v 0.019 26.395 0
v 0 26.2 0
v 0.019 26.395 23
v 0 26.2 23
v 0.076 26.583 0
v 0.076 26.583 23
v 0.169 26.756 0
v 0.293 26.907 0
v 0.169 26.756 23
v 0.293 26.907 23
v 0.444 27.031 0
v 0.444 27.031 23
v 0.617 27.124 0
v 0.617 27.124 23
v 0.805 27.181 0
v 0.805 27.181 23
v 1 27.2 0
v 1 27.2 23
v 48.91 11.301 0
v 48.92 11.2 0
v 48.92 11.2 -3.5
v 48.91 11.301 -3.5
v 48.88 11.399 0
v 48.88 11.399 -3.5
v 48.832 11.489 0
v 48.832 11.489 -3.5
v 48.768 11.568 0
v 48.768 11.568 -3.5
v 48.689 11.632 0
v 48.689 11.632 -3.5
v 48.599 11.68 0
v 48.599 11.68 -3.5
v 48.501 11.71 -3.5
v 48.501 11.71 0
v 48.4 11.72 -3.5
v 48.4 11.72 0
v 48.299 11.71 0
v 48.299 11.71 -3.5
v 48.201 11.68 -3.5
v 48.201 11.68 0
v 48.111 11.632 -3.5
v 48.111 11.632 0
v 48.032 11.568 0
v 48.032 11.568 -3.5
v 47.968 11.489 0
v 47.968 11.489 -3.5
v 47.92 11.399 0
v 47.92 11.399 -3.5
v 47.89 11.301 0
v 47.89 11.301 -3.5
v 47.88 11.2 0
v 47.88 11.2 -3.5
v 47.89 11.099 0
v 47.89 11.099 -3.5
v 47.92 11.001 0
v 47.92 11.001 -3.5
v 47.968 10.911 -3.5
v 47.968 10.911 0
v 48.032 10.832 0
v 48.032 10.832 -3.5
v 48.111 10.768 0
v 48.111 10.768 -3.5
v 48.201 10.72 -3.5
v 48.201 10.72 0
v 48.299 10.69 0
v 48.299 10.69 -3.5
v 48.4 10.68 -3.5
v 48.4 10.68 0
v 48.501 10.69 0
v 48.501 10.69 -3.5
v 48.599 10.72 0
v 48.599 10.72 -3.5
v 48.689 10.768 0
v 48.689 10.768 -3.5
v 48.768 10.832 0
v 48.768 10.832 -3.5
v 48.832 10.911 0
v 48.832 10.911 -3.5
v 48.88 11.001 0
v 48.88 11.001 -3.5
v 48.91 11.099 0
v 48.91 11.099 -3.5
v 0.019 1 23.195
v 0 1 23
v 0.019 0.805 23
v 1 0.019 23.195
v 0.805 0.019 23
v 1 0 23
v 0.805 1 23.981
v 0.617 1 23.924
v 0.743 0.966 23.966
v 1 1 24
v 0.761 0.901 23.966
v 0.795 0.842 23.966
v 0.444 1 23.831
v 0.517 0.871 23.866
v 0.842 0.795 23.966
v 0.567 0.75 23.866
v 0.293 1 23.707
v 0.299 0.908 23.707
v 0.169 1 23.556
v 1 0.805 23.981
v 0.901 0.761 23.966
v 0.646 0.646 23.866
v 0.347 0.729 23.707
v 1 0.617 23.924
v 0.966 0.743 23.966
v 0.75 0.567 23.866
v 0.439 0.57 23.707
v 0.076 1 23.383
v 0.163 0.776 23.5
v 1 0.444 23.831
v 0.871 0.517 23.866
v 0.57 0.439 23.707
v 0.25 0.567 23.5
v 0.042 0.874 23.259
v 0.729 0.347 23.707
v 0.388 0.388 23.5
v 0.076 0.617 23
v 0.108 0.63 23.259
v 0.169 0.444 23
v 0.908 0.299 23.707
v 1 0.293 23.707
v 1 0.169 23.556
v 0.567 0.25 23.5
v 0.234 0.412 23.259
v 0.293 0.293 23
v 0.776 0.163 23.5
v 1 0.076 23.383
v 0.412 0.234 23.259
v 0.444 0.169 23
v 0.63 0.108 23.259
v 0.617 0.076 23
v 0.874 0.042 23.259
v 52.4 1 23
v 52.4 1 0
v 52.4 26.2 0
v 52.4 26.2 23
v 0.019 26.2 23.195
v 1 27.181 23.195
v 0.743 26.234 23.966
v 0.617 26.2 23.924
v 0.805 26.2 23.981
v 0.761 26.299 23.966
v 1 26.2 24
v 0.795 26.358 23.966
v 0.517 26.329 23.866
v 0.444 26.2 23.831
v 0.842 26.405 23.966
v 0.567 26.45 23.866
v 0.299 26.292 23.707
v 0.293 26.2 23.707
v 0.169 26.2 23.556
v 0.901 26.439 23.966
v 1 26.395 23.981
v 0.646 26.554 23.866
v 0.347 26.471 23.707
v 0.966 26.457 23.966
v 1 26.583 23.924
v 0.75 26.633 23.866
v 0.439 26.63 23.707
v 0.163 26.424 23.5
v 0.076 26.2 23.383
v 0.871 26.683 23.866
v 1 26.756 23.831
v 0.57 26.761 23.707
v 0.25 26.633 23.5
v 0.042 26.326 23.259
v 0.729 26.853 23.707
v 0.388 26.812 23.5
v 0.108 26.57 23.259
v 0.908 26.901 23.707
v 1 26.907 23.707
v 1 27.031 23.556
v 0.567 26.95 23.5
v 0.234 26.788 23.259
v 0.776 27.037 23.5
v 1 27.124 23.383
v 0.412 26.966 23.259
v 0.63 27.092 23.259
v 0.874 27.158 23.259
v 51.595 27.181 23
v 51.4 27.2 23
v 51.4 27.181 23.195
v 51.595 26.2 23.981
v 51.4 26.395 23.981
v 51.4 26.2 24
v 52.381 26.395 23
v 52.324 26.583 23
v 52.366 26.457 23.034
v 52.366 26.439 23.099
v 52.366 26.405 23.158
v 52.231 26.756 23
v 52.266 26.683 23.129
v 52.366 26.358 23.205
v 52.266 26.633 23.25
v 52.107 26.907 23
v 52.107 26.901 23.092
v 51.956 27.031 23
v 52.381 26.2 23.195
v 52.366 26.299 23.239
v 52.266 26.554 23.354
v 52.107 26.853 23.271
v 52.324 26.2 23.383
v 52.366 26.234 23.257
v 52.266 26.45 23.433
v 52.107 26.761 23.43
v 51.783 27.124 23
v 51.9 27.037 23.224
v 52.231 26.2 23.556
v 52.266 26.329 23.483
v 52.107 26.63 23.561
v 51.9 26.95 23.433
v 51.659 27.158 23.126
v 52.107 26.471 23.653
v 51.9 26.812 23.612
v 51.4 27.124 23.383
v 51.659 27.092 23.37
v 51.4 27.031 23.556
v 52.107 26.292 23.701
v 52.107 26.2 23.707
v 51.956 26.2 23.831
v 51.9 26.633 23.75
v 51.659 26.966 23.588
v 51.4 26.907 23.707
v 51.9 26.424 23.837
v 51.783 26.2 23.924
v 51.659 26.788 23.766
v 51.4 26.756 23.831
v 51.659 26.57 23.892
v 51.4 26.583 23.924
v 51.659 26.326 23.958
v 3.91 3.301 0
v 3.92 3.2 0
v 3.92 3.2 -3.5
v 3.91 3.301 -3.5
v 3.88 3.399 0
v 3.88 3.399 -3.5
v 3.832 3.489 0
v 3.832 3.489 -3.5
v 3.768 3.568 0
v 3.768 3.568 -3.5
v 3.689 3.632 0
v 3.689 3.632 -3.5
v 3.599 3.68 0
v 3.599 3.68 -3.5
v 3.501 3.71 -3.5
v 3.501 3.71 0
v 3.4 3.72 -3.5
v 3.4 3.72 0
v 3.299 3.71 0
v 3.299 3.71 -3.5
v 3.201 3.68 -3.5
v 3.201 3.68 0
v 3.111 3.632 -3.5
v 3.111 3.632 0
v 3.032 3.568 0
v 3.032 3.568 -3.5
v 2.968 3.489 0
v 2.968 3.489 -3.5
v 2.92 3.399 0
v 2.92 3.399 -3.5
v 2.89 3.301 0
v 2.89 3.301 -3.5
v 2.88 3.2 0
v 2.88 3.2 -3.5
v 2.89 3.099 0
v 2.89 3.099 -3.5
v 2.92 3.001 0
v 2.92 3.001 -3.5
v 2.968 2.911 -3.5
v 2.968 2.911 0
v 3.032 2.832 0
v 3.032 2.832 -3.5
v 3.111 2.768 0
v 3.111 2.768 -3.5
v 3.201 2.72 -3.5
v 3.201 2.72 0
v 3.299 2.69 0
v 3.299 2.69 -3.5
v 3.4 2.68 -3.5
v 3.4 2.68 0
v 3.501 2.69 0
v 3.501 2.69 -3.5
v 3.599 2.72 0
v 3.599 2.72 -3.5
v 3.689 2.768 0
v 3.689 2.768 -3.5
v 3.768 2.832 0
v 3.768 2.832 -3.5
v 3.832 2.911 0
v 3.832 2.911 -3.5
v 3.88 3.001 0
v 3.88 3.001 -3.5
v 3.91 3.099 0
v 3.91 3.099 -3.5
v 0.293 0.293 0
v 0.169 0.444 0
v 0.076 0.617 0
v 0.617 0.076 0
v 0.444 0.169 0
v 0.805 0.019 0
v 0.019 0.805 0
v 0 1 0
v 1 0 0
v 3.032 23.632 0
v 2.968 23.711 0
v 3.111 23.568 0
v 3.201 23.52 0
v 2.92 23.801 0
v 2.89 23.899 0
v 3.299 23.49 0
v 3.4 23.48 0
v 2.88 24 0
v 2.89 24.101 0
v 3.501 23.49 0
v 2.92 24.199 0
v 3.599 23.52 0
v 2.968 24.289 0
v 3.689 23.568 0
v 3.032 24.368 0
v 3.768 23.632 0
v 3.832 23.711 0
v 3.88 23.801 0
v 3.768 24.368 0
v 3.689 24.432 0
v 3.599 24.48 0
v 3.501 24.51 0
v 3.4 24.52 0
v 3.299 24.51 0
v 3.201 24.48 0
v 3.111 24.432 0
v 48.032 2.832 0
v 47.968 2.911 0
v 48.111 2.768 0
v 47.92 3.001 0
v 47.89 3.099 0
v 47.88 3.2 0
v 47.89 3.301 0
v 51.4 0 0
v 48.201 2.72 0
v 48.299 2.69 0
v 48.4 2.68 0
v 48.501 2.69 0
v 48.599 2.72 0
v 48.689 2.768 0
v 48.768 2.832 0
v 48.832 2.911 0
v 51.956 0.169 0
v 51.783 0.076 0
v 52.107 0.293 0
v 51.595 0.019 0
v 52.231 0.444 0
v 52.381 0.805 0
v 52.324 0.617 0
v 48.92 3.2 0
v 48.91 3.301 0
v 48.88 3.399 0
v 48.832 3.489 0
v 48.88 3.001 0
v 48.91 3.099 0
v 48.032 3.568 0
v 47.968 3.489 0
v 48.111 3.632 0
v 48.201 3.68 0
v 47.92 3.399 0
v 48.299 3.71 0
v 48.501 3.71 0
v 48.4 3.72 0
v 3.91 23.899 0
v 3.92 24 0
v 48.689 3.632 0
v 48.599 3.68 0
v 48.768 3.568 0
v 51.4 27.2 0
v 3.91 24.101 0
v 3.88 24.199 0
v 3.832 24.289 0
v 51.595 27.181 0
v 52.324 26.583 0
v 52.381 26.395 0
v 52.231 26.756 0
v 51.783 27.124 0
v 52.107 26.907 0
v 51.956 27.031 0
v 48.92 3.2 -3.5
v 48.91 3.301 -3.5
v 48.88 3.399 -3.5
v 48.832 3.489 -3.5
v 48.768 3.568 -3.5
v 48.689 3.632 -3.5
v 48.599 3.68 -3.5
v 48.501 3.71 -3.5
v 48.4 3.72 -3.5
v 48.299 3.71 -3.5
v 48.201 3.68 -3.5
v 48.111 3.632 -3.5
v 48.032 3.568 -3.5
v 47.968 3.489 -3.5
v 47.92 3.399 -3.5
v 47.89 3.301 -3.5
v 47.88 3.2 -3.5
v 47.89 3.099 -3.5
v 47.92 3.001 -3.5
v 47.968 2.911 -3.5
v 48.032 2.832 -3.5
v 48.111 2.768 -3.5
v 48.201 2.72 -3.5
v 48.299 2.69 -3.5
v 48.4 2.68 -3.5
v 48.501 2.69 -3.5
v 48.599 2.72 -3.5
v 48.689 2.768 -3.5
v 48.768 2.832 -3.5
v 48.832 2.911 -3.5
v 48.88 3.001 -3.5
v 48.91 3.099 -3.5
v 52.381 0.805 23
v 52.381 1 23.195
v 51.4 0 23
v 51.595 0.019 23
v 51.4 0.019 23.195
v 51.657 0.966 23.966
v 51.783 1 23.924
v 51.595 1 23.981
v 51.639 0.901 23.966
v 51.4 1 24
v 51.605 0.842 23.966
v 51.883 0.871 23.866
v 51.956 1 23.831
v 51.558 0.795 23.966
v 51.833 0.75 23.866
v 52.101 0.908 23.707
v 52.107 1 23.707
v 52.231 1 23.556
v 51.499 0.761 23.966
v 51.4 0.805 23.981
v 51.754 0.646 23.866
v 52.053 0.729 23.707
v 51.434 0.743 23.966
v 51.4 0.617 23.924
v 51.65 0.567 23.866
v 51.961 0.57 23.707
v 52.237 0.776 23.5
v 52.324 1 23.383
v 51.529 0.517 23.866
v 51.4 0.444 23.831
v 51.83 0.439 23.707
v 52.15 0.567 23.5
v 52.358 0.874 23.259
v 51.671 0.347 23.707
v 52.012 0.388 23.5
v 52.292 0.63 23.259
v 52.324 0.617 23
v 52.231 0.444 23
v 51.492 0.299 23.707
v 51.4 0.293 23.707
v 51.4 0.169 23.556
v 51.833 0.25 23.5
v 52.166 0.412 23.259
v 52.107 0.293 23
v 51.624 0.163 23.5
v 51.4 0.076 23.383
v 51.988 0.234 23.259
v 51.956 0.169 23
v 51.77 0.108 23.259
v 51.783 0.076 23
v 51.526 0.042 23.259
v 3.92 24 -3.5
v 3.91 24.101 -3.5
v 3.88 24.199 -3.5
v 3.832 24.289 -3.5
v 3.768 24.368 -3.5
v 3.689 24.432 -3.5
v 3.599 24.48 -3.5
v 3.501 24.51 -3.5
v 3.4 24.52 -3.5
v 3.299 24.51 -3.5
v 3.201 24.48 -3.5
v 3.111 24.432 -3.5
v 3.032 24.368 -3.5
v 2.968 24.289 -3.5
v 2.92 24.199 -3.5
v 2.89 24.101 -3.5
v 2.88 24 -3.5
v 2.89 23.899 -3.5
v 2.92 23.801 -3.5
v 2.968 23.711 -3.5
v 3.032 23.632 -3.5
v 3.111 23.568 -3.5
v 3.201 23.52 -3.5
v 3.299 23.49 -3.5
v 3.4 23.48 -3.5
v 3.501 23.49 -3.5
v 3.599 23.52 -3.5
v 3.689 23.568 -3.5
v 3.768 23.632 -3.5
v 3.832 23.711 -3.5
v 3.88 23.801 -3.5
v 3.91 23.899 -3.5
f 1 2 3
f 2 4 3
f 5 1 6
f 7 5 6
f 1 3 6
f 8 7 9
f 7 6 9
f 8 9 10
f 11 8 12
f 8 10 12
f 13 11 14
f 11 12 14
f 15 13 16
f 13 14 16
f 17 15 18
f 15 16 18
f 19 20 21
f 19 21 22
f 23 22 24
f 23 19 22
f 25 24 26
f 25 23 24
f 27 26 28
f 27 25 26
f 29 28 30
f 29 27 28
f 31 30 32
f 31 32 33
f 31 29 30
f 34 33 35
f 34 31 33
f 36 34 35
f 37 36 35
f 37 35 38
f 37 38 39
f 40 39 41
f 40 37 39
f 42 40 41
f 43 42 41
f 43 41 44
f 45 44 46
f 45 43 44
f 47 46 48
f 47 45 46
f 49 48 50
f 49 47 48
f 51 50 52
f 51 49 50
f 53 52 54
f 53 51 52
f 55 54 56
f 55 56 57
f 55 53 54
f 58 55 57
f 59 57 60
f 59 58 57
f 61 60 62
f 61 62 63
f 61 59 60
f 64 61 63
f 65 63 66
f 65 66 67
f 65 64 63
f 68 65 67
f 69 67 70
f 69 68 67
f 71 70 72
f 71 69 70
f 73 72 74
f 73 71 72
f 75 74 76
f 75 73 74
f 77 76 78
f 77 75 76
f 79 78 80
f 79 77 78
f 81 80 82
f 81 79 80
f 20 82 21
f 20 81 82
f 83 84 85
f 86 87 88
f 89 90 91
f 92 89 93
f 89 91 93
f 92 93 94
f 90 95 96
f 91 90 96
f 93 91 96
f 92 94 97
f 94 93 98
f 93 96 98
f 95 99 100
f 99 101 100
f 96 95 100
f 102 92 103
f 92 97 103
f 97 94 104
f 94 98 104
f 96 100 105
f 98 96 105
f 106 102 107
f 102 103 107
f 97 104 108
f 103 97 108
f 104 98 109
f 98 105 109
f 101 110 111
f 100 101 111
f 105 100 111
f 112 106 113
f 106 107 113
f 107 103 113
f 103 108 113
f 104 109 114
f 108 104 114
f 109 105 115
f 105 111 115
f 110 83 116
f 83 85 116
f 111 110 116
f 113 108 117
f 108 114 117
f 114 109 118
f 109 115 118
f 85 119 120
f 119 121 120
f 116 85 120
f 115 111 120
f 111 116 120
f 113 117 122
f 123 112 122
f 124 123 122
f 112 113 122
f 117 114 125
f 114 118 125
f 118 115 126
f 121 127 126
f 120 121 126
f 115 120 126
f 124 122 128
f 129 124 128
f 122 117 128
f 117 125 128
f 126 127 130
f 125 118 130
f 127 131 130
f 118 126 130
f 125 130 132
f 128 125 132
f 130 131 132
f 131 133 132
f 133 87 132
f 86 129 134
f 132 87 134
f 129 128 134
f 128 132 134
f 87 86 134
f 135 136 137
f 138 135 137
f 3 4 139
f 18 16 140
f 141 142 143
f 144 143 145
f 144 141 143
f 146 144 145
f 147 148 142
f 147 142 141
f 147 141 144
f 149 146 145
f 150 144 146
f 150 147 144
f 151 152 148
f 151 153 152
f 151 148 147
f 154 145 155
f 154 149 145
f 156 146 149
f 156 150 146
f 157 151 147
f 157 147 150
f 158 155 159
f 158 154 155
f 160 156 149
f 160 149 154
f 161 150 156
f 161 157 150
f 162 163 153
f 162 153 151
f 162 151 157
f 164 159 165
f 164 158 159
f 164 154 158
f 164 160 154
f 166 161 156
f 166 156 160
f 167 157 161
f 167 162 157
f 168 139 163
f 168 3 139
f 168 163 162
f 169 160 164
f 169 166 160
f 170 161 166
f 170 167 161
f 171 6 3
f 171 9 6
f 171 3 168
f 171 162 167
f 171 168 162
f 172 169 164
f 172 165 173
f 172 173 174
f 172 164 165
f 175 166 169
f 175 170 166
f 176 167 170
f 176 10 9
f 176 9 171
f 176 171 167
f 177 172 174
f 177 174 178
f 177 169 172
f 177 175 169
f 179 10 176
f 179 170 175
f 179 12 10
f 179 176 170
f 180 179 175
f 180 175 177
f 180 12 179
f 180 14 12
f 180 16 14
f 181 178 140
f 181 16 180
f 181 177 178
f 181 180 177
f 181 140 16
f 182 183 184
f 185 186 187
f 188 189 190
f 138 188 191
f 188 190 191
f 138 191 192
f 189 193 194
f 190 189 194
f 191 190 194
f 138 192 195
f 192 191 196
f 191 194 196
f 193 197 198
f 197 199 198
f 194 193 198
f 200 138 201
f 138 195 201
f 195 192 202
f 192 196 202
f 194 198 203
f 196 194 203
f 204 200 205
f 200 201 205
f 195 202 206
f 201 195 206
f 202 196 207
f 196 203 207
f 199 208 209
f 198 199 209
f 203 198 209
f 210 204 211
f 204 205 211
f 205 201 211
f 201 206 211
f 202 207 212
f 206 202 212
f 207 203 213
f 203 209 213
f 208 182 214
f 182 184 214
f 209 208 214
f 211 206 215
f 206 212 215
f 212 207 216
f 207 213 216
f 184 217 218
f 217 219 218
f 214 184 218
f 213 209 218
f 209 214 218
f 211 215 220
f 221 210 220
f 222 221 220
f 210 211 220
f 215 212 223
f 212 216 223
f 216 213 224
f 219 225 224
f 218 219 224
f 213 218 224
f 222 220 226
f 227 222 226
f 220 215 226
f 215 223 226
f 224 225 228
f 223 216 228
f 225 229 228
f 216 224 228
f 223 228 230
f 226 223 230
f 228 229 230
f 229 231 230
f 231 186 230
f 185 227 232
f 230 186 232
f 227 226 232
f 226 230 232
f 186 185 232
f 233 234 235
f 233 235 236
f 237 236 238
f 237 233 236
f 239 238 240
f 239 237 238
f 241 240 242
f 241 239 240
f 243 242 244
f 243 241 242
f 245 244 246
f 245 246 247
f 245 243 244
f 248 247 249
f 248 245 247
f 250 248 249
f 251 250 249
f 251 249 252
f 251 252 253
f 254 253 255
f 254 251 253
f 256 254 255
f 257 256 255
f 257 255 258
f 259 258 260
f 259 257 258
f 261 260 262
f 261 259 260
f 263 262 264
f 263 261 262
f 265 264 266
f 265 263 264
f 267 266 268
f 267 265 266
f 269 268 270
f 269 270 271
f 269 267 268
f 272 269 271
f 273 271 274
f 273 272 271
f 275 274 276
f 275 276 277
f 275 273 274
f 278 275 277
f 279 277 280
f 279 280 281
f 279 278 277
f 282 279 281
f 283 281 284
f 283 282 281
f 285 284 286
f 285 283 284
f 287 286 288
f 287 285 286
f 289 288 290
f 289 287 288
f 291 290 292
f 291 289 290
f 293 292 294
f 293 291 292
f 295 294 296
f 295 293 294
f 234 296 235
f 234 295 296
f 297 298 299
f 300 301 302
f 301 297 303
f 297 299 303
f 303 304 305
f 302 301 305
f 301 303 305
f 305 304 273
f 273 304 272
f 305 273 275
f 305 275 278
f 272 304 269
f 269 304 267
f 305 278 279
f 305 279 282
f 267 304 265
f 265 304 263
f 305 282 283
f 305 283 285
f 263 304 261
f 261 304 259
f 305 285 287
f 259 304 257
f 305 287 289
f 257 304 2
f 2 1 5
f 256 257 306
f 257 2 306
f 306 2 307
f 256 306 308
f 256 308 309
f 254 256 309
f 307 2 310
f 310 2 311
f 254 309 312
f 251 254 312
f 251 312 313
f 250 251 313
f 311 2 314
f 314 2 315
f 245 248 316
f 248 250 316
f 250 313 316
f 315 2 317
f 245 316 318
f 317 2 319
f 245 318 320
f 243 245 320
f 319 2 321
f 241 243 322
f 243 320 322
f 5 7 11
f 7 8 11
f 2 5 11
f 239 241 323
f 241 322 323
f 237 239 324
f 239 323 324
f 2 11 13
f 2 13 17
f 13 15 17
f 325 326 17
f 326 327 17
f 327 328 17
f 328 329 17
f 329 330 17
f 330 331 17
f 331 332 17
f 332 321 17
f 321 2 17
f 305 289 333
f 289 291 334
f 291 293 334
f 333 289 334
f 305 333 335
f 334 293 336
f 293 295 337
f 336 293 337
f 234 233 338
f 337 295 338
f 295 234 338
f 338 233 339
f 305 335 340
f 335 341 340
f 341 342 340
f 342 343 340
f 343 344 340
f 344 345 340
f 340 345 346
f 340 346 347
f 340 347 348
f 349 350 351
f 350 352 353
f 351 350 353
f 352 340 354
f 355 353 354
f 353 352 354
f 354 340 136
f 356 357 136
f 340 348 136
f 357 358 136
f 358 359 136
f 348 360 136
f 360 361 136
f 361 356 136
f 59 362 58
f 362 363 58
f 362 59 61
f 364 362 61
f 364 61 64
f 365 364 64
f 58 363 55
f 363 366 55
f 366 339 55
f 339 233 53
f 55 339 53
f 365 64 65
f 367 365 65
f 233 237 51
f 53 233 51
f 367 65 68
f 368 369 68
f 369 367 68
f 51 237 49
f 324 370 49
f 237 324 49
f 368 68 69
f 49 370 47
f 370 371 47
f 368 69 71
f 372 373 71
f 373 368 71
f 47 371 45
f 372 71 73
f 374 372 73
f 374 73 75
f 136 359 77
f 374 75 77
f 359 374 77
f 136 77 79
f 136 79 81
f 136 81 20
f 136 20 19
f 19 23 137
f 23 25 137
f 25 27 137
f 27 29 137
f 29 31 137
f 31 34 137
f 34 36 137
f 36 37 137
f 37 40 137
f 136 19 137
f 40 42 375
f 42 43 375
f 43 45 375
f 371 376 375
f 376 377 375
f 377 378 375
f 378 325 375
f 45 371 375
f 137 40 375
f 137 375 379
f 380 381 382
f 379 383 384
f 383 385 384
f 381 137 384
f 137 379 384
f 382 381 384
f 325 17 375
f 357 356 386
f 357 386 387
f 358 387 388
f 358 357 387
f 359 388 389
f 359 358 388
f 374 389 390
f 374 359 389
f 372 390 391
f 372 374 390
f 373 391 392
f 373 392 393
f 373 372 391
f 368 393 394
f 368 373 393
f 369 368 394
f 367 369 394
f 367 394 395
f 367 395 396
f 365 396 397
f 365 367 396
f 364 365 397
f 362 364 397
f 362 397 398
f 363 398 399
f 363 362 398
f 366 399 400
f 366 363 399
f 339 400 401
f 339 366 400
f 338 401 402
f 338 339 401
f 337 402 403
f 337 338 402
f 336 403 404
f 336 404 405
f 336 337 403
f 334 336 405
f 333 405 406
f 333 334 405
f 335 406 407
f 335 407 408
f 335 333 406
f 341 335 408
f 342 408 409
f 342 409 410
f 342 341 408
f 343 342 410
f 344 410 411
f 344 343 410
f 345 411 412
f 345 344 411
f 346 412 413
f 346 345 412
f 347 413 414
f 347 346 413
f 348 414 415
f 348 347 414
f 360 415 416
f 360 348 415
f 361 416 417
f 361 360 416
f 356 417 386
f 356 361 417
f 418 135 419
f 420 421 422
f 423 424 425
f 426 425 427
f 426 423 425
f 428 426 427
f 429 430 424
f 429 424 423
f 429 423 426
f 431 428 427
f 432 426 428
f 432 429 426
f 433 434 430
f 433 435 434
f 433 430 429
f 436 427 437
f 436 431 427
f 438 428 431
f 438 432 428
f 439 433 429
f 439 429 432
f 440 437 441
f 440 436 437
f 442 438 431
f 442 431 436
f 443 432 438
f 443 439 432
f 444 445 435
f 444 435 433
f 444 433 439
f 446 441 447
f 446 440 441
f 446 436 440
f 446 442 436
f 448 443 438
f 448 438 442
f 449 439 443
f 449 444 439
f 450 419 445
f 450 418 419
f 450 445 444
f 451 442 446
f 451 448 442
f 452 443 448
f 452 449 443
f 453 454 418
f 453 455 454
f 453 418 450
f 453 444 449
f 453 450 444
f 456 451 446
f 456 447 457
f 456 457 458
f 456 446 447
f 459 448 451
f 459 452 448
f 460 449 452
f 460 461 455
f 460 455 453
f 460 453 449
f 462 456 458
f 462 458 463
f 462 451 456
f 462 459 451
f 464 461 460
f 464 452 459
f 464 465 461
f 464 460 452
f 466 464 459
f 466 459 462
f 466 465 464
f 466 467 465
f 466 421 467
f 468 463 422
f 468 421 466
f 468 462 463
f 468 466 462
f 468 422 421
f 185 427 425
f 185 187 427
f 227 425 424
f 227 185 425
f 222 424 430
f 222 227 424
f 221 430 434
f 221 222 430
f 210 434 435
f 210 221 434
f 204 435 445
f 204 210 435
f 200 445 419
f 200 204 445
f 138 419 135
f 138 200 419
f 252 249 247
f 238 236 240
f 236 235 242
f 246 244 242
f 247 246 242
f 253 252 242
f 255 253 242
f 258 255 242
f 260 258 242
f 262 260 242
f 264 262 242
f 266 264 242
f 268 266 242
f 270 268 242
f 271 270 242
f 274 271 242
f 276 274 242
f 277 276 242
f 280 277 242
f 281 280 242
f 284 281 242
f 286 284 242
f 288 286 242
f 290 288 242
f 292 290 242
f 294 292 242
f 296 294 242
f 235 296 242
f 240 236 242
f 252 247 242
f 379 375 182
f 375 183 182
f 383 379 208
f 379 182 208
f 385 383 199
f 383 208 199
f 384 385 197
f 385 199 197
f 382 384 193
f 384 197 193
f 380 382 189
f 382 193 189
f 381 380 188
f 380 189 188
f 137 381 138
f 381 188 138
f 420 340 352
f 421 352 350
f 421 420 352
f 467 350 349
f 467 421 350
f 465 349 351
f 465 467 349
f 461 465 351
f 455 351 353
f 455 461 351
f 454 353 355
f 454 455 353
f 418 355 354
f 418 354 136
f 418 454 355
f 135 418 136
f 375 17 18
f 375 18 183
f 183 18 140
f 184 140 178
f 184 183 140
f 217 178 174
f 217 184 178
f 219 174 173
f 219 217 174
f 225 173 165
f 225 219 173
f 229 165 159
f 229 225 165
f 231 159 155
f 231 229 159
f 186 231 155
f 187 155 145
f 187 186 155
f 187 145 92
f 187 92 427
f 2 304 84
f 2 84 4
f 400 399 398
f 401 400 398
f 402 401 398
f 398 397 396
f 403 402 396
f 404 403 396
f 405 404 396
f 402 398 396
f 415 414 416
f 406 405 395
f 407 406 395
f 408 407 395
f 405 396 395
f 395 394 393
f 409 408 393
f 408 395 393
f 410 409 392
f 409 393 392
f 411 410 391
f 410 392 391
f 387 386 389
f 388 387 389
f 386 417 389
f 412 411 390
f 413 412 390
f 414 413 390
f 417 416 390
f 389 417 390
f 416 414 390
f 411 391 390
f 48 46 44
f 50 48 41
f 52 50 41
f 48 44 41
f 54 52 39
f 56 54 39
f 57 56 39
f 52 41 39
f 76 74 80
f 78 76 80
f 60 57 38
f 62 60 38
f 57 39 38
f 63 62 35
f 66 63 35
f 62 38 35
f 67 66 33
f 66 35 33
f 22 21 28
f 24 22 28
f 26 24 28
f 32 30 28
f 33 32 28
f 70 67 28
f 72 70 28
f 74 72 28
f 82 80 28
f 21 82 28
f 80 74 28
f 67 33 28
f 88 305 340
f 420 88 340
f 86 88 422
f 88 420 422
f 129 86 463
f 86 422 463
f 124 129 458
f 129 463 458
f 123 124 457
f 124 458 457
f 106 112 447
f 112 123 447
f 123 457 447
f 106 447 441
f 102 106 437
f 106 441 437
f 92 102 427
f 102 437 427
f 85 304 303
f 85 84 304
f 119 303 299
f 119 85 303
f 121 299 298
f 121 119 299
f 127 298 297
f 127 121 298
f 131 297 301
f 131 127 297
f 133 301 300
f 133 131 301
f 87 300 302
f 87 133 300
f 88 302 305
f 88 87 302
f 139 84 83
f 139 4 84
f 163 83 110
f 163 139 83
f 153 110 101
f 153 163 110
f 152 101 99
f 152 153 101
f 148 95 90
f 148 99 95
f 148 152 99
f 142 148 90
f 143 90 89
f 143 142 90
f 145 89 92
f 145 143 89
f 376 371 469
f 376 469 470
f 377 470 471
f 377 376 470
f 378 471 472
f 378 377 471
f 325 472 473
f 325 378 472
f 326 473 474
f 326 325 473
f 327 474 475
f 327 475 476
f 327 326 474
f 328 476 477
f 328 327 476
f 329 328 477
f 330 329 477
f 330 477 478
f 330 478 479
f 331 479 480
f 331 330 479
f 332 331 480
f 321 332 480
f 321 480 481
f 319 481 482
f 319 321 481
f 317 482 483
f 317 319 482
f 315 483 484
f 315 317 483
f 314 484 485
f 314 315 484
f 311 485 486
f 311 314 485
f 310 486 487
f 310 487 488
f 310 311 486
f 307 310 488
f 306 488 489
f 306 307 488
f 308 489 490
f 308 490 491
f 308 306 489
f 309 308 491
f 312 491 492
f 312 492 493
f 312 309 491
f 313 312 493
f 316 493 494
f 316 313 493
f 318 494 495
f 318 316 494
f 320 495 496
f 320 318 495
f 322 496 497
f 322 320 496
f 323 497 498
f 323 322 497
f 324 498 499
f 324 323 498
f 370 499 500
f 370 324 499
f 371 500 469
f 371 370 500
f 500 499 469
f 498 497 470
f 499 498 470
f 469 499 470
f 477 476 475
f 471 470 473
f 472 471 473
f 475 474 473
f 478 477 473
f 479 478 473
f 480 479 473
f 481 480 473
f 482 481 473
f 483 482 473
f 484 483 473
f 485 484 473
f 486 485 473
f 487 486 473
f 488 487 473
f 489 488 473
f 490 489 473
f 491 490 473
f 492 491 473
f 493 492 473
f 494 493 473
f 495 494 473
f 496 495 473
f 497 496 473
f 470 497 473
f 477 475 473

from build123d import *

# Parameters (mm, degrees)
F0_W     = 52.4
F0_H     = 27.2
F1_DEPTH = 24
F2_R     = 0.52
F3_DEPTH = 3.5
F4_R     = 1


with BuildPart() as f1:
    # F0 (on Top) → F1 (new body)
    with BuildSketch(Plane.XY):
        with Locations((26.2, 13.6)):
            Rectangle(F0_W, F0_H)
    extrude(amount=F1_DEPTH)

    # F2 (on Top) → F3 (join)
    with BuildSketch(Plane.XY):
        with Locations((3.4, 3.2)):
            Circle(F2_R)
        with Locations((3.4, 24)):
            Circle(F2_R)
        with Locations((48.4, 3.2)):
            Circle(F2_R)
        with Locations((48.4, 11.2)):
            Circle(F2_R)
    extrude(amount=-F3_DEPTH)

    # F4
    f4_edges = [f1.edges().sort_by_distance(p)[0] for p in [
        (0, 0, 12),
        (52.4, 0, 12),
        (0, 27.2, 12),
        (0, 13.6, 24),
        (26.2, 27.2, 24),
        (52.4, 27.2, 12),
        (52.4, 13.6, 24),
        (26.2, 0, 24),
    ]]
    fillet(f4_edges, radius=F4_R)


solid = f1.part
